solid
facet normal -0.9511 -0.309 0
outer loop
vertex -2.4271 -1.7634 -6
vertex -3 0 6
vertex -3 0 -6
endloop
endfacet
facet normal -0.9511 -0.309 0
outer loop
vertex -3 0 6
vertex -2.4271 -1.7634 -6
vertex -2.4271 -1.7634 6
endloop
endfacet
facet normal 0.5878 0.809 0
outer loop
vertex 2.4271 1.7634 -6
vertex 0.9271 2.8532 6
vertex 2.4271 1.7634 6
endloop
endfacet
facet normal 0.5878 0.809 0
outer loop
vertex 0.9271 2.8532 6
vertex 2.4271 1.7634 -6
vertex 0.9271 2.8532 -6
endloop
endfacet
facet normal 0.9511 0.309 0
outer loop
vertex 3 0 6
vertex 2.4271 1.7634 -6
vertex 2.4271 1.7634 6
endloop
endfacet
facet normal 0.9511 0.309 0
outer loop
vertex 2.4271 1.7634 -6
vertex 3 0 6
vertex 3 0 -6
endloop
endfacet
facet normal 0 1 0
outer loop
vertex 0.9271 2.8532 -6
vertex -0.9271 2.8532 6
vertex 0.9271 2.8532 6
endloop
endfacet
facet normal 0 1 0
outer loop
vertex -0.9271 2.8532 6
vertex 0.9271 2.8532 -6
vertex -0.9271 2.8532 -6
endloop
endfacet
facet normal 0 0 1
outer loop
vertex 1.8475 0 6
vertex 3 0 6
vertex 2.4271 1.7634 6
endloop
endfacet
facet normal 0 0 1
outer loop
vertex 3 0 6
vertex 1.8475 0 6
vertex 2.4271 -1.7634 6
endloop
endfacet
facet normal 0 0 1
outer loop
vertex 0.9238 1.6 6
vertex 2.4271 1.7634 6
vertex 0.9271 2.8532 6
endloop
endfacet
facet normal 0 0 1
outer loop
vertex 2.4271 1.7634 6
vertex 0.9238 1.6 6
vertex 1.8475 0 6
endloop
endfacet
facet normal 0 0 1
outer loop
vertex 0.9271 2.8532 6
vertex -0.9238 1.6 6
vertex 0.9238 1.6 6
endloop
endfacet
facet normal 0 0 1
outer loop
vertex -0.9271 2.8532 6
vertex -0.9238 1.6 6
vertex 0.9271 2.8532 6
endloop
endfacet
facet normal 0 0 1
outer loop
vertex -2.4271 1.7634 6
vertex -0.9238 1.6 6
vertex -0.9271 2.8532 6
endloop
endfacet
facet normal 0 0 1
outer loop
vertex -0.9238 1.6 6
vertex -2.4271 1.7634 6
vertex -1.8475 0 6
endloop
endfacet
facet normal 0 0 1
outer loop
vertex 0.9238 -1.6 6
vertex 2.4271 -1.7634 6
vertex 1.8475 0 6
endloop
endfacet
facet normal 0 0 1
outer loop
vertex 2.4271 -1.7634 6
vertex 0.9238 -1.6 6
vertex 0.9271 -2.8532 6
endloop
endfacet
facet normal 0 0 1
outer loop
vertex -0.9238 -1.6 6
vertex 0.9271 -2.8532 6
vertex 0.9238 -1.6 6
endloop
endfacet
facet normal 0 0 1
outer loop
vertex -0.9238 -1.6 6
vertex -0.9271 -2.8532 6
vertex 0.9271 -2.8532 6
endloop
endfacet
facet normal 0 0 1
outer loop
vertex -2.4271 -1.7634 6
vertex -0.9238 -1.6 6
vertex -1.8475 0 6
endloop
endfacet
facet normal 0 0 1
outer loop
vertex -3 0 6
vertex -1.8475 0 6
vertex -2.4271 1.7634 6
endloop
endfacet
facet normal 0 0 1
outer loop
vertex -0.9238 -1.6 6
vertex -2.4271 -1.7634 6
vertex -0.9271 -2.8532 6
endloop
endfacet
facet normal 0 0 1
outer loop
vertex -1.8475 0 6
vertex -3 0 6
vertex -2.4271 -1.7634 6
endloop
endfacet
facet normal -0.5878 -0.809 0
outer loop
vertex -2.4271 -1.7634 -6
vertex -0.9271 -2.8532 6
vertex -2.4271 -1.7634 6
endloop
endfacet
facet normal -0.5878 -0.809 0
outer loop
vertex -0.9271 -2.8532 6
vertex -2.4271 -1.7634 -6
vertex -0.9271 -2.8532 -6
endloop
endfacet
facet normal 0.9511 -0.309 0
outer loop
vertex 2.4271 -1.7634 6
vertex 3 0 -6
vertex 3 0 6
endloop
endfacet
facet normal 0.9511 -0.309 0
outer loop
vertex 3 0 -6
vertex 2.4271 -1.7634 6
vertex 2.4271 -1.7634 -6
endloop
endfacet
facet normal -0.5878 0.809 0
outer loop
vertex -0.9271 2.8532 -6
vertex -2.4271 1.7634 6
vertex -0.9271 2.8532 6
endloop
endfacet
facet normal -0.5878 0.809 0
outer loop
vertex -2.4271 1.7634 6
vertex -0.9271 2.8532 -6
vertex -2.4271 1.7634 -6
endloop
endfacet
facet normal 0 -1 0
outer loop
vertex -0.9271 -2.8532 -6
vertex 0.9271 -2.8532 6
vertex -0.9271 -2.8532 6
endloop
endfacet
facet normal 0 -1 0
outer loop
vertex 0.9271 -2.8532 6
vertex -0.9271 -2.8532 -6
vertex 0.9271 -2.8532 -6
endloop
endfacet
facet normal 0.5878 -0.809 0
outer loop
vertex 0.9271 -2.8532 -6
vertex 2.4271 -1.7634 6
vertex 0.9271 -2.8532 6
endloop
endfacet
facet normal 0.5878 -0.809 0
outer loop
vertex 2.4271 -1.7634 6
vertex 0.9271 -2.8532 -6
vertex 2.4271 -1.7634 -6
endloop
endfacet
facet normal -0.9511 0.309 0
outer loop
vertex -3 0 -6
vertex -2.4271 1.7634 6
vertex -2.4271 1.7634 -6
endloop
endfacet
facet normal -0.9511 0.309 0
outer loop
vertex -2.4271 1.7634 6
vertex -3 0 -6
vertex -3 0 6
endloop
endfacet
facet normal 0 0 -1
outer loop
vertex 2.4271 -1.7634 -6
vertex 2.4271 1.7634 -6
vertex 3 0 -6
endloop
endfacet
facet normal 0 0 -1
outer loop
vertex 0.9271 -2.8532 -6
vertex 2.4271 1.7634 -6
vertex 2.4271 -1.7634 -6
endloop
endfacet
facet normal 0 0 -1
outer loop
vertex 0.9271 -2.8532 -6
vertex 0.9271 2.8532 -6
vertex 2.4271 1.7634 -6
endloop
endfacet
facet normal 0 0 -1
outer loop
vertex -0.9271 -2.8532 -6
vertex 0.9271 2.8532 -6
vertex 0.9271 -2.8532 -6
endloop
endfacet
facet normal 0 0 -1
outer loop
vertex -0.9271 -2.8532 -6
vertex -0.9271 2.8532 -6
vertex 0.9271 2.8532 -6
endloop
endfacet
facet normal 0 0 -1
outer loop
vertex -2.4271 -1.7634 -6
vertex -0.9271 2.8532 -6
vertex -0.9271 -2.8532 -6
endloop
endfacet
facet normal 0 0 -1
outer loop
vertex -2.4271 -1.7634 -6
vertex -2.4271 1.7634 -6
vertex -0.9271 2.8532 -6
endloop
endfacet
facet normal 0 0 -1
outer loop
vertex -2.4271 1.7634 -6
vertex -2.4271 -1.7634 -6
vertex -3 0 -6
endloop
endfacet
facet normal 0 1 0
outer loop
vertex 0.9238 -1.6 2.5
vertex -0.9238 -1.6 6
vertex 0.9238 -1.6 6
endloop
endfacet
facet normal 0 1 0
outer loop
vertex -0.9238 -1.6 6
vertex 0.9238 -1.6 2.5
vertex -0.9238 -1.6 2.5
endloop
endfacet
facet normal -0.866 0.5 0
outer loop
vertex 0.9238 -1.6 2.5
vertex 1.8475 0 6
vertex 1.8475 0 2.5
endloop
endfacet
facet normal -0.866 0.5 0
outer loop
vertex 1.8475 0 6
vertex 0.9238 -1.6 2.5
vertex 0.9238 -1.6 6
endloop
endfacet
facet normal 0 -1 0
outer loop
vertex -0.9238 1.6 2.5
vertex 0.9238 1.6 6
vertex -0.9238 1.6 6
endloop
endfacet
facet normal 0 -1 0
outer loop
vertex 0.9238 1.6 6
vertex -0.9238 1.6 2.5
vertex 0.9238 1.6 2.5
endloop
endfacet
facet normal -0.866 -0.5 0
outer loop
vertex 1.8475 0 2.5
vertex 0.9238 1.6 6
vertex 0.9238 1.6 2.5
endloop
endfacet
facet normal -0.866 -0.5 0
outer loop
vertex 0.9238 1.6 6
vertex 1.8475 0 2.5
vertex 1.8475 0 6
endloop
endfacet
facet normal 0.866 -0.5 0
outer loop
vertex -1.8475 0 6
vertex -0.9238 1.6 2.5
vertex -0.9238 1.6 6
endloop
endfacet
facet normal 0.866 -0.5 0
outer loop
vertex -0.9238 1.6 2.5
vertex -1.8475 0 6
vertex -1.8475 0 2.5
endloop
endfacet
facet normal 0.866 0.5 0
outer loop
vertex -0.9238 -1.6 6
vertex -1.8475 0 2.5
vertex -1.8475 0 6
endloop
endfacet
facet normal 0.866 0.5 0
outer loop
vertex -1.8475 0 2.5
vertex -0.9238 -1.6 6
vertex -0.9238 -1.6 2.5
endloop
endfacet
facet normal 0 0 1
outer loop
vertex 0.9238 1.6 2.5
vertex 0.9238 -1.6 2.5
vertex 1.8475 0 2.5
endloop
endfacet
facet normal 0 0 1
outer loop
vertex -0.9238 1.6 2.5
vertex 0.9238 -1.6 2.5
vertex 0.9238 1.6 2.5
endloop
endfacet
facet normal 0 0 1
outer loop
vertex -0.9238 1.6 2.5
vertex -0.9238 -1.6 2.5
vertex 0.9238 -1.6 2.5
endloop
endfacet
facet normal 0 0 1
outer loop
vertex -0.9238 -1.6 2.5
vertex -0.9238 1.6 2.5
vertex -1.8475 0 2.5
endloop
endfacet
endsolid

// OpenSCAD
// Parameters
length_mm = 12; //[6:24:1]
thread_major_d_mm = 6; //[3:12:0.5]
thread_pitch_mm = 1; //[0.5:2:0.1]
socket_af_mm = 3; //[2:5:0.5]
socket_depth_mm = 3; //[1.5:6:0.5]
tolerance_mm = 0.2; //[0.05:0.5:0.05]
point_style = 0; //[0:1:1]
cup_point_depth_mm = 0.8; //[0.3:2:0.1]
cup_point_radius_mm = 1.5; //[0.8:3:0.1]
thread_visual_depth_mm = 0.25; //[0.1:0.6:0.05]
thread_groove_count = 10; //[4:30:1]
overlap_mm = 1; //[0.5:2:0.1]

// Screw - complete geometry
module screw() {
  color("DimGray") {
    // Grub screw body
    difference() {
      cylinder(r=thread_major_d_mm/2, h=length_mm, center=true);
      // Hex socket drive
      translate([0, 0, length_mm/2 - socket_depth_mm/2])
        cylinder(r=(socket_af_mm + tolerance_mm)/cos(30)/2, h=socket_depth_mm + overlap_mm, center=true);
    }
    
    // Threaded shaft with visual threads
    difference() {
      cylinder(r=thread_major_d_mm/2, h=length_mm, center=true);
      union() {
        for (i = [0:thread_groove_count-1]) {
          translate([0, 0, -length_mm/2 + (i+0.5)*(length_mm/thread_groove_count)])
            cylinder(r=thread_major_d_mm/2 - thread_visual_depth_mm, h=thread_pitch_mm/2 + overlap_mm, center=true);
        }
      }
    }
    
    // Flat or cup point tip
    if (point_style == 1) {
      translate([0, 0, -length_mm/2 + cup_point_radius_mm - cup_point_depth_mm])
        sphere(r=cup_point_radius_mm, center=true);
    }
  }
}

// Assembly
module assembly() {
  screw();
}

assembly();
